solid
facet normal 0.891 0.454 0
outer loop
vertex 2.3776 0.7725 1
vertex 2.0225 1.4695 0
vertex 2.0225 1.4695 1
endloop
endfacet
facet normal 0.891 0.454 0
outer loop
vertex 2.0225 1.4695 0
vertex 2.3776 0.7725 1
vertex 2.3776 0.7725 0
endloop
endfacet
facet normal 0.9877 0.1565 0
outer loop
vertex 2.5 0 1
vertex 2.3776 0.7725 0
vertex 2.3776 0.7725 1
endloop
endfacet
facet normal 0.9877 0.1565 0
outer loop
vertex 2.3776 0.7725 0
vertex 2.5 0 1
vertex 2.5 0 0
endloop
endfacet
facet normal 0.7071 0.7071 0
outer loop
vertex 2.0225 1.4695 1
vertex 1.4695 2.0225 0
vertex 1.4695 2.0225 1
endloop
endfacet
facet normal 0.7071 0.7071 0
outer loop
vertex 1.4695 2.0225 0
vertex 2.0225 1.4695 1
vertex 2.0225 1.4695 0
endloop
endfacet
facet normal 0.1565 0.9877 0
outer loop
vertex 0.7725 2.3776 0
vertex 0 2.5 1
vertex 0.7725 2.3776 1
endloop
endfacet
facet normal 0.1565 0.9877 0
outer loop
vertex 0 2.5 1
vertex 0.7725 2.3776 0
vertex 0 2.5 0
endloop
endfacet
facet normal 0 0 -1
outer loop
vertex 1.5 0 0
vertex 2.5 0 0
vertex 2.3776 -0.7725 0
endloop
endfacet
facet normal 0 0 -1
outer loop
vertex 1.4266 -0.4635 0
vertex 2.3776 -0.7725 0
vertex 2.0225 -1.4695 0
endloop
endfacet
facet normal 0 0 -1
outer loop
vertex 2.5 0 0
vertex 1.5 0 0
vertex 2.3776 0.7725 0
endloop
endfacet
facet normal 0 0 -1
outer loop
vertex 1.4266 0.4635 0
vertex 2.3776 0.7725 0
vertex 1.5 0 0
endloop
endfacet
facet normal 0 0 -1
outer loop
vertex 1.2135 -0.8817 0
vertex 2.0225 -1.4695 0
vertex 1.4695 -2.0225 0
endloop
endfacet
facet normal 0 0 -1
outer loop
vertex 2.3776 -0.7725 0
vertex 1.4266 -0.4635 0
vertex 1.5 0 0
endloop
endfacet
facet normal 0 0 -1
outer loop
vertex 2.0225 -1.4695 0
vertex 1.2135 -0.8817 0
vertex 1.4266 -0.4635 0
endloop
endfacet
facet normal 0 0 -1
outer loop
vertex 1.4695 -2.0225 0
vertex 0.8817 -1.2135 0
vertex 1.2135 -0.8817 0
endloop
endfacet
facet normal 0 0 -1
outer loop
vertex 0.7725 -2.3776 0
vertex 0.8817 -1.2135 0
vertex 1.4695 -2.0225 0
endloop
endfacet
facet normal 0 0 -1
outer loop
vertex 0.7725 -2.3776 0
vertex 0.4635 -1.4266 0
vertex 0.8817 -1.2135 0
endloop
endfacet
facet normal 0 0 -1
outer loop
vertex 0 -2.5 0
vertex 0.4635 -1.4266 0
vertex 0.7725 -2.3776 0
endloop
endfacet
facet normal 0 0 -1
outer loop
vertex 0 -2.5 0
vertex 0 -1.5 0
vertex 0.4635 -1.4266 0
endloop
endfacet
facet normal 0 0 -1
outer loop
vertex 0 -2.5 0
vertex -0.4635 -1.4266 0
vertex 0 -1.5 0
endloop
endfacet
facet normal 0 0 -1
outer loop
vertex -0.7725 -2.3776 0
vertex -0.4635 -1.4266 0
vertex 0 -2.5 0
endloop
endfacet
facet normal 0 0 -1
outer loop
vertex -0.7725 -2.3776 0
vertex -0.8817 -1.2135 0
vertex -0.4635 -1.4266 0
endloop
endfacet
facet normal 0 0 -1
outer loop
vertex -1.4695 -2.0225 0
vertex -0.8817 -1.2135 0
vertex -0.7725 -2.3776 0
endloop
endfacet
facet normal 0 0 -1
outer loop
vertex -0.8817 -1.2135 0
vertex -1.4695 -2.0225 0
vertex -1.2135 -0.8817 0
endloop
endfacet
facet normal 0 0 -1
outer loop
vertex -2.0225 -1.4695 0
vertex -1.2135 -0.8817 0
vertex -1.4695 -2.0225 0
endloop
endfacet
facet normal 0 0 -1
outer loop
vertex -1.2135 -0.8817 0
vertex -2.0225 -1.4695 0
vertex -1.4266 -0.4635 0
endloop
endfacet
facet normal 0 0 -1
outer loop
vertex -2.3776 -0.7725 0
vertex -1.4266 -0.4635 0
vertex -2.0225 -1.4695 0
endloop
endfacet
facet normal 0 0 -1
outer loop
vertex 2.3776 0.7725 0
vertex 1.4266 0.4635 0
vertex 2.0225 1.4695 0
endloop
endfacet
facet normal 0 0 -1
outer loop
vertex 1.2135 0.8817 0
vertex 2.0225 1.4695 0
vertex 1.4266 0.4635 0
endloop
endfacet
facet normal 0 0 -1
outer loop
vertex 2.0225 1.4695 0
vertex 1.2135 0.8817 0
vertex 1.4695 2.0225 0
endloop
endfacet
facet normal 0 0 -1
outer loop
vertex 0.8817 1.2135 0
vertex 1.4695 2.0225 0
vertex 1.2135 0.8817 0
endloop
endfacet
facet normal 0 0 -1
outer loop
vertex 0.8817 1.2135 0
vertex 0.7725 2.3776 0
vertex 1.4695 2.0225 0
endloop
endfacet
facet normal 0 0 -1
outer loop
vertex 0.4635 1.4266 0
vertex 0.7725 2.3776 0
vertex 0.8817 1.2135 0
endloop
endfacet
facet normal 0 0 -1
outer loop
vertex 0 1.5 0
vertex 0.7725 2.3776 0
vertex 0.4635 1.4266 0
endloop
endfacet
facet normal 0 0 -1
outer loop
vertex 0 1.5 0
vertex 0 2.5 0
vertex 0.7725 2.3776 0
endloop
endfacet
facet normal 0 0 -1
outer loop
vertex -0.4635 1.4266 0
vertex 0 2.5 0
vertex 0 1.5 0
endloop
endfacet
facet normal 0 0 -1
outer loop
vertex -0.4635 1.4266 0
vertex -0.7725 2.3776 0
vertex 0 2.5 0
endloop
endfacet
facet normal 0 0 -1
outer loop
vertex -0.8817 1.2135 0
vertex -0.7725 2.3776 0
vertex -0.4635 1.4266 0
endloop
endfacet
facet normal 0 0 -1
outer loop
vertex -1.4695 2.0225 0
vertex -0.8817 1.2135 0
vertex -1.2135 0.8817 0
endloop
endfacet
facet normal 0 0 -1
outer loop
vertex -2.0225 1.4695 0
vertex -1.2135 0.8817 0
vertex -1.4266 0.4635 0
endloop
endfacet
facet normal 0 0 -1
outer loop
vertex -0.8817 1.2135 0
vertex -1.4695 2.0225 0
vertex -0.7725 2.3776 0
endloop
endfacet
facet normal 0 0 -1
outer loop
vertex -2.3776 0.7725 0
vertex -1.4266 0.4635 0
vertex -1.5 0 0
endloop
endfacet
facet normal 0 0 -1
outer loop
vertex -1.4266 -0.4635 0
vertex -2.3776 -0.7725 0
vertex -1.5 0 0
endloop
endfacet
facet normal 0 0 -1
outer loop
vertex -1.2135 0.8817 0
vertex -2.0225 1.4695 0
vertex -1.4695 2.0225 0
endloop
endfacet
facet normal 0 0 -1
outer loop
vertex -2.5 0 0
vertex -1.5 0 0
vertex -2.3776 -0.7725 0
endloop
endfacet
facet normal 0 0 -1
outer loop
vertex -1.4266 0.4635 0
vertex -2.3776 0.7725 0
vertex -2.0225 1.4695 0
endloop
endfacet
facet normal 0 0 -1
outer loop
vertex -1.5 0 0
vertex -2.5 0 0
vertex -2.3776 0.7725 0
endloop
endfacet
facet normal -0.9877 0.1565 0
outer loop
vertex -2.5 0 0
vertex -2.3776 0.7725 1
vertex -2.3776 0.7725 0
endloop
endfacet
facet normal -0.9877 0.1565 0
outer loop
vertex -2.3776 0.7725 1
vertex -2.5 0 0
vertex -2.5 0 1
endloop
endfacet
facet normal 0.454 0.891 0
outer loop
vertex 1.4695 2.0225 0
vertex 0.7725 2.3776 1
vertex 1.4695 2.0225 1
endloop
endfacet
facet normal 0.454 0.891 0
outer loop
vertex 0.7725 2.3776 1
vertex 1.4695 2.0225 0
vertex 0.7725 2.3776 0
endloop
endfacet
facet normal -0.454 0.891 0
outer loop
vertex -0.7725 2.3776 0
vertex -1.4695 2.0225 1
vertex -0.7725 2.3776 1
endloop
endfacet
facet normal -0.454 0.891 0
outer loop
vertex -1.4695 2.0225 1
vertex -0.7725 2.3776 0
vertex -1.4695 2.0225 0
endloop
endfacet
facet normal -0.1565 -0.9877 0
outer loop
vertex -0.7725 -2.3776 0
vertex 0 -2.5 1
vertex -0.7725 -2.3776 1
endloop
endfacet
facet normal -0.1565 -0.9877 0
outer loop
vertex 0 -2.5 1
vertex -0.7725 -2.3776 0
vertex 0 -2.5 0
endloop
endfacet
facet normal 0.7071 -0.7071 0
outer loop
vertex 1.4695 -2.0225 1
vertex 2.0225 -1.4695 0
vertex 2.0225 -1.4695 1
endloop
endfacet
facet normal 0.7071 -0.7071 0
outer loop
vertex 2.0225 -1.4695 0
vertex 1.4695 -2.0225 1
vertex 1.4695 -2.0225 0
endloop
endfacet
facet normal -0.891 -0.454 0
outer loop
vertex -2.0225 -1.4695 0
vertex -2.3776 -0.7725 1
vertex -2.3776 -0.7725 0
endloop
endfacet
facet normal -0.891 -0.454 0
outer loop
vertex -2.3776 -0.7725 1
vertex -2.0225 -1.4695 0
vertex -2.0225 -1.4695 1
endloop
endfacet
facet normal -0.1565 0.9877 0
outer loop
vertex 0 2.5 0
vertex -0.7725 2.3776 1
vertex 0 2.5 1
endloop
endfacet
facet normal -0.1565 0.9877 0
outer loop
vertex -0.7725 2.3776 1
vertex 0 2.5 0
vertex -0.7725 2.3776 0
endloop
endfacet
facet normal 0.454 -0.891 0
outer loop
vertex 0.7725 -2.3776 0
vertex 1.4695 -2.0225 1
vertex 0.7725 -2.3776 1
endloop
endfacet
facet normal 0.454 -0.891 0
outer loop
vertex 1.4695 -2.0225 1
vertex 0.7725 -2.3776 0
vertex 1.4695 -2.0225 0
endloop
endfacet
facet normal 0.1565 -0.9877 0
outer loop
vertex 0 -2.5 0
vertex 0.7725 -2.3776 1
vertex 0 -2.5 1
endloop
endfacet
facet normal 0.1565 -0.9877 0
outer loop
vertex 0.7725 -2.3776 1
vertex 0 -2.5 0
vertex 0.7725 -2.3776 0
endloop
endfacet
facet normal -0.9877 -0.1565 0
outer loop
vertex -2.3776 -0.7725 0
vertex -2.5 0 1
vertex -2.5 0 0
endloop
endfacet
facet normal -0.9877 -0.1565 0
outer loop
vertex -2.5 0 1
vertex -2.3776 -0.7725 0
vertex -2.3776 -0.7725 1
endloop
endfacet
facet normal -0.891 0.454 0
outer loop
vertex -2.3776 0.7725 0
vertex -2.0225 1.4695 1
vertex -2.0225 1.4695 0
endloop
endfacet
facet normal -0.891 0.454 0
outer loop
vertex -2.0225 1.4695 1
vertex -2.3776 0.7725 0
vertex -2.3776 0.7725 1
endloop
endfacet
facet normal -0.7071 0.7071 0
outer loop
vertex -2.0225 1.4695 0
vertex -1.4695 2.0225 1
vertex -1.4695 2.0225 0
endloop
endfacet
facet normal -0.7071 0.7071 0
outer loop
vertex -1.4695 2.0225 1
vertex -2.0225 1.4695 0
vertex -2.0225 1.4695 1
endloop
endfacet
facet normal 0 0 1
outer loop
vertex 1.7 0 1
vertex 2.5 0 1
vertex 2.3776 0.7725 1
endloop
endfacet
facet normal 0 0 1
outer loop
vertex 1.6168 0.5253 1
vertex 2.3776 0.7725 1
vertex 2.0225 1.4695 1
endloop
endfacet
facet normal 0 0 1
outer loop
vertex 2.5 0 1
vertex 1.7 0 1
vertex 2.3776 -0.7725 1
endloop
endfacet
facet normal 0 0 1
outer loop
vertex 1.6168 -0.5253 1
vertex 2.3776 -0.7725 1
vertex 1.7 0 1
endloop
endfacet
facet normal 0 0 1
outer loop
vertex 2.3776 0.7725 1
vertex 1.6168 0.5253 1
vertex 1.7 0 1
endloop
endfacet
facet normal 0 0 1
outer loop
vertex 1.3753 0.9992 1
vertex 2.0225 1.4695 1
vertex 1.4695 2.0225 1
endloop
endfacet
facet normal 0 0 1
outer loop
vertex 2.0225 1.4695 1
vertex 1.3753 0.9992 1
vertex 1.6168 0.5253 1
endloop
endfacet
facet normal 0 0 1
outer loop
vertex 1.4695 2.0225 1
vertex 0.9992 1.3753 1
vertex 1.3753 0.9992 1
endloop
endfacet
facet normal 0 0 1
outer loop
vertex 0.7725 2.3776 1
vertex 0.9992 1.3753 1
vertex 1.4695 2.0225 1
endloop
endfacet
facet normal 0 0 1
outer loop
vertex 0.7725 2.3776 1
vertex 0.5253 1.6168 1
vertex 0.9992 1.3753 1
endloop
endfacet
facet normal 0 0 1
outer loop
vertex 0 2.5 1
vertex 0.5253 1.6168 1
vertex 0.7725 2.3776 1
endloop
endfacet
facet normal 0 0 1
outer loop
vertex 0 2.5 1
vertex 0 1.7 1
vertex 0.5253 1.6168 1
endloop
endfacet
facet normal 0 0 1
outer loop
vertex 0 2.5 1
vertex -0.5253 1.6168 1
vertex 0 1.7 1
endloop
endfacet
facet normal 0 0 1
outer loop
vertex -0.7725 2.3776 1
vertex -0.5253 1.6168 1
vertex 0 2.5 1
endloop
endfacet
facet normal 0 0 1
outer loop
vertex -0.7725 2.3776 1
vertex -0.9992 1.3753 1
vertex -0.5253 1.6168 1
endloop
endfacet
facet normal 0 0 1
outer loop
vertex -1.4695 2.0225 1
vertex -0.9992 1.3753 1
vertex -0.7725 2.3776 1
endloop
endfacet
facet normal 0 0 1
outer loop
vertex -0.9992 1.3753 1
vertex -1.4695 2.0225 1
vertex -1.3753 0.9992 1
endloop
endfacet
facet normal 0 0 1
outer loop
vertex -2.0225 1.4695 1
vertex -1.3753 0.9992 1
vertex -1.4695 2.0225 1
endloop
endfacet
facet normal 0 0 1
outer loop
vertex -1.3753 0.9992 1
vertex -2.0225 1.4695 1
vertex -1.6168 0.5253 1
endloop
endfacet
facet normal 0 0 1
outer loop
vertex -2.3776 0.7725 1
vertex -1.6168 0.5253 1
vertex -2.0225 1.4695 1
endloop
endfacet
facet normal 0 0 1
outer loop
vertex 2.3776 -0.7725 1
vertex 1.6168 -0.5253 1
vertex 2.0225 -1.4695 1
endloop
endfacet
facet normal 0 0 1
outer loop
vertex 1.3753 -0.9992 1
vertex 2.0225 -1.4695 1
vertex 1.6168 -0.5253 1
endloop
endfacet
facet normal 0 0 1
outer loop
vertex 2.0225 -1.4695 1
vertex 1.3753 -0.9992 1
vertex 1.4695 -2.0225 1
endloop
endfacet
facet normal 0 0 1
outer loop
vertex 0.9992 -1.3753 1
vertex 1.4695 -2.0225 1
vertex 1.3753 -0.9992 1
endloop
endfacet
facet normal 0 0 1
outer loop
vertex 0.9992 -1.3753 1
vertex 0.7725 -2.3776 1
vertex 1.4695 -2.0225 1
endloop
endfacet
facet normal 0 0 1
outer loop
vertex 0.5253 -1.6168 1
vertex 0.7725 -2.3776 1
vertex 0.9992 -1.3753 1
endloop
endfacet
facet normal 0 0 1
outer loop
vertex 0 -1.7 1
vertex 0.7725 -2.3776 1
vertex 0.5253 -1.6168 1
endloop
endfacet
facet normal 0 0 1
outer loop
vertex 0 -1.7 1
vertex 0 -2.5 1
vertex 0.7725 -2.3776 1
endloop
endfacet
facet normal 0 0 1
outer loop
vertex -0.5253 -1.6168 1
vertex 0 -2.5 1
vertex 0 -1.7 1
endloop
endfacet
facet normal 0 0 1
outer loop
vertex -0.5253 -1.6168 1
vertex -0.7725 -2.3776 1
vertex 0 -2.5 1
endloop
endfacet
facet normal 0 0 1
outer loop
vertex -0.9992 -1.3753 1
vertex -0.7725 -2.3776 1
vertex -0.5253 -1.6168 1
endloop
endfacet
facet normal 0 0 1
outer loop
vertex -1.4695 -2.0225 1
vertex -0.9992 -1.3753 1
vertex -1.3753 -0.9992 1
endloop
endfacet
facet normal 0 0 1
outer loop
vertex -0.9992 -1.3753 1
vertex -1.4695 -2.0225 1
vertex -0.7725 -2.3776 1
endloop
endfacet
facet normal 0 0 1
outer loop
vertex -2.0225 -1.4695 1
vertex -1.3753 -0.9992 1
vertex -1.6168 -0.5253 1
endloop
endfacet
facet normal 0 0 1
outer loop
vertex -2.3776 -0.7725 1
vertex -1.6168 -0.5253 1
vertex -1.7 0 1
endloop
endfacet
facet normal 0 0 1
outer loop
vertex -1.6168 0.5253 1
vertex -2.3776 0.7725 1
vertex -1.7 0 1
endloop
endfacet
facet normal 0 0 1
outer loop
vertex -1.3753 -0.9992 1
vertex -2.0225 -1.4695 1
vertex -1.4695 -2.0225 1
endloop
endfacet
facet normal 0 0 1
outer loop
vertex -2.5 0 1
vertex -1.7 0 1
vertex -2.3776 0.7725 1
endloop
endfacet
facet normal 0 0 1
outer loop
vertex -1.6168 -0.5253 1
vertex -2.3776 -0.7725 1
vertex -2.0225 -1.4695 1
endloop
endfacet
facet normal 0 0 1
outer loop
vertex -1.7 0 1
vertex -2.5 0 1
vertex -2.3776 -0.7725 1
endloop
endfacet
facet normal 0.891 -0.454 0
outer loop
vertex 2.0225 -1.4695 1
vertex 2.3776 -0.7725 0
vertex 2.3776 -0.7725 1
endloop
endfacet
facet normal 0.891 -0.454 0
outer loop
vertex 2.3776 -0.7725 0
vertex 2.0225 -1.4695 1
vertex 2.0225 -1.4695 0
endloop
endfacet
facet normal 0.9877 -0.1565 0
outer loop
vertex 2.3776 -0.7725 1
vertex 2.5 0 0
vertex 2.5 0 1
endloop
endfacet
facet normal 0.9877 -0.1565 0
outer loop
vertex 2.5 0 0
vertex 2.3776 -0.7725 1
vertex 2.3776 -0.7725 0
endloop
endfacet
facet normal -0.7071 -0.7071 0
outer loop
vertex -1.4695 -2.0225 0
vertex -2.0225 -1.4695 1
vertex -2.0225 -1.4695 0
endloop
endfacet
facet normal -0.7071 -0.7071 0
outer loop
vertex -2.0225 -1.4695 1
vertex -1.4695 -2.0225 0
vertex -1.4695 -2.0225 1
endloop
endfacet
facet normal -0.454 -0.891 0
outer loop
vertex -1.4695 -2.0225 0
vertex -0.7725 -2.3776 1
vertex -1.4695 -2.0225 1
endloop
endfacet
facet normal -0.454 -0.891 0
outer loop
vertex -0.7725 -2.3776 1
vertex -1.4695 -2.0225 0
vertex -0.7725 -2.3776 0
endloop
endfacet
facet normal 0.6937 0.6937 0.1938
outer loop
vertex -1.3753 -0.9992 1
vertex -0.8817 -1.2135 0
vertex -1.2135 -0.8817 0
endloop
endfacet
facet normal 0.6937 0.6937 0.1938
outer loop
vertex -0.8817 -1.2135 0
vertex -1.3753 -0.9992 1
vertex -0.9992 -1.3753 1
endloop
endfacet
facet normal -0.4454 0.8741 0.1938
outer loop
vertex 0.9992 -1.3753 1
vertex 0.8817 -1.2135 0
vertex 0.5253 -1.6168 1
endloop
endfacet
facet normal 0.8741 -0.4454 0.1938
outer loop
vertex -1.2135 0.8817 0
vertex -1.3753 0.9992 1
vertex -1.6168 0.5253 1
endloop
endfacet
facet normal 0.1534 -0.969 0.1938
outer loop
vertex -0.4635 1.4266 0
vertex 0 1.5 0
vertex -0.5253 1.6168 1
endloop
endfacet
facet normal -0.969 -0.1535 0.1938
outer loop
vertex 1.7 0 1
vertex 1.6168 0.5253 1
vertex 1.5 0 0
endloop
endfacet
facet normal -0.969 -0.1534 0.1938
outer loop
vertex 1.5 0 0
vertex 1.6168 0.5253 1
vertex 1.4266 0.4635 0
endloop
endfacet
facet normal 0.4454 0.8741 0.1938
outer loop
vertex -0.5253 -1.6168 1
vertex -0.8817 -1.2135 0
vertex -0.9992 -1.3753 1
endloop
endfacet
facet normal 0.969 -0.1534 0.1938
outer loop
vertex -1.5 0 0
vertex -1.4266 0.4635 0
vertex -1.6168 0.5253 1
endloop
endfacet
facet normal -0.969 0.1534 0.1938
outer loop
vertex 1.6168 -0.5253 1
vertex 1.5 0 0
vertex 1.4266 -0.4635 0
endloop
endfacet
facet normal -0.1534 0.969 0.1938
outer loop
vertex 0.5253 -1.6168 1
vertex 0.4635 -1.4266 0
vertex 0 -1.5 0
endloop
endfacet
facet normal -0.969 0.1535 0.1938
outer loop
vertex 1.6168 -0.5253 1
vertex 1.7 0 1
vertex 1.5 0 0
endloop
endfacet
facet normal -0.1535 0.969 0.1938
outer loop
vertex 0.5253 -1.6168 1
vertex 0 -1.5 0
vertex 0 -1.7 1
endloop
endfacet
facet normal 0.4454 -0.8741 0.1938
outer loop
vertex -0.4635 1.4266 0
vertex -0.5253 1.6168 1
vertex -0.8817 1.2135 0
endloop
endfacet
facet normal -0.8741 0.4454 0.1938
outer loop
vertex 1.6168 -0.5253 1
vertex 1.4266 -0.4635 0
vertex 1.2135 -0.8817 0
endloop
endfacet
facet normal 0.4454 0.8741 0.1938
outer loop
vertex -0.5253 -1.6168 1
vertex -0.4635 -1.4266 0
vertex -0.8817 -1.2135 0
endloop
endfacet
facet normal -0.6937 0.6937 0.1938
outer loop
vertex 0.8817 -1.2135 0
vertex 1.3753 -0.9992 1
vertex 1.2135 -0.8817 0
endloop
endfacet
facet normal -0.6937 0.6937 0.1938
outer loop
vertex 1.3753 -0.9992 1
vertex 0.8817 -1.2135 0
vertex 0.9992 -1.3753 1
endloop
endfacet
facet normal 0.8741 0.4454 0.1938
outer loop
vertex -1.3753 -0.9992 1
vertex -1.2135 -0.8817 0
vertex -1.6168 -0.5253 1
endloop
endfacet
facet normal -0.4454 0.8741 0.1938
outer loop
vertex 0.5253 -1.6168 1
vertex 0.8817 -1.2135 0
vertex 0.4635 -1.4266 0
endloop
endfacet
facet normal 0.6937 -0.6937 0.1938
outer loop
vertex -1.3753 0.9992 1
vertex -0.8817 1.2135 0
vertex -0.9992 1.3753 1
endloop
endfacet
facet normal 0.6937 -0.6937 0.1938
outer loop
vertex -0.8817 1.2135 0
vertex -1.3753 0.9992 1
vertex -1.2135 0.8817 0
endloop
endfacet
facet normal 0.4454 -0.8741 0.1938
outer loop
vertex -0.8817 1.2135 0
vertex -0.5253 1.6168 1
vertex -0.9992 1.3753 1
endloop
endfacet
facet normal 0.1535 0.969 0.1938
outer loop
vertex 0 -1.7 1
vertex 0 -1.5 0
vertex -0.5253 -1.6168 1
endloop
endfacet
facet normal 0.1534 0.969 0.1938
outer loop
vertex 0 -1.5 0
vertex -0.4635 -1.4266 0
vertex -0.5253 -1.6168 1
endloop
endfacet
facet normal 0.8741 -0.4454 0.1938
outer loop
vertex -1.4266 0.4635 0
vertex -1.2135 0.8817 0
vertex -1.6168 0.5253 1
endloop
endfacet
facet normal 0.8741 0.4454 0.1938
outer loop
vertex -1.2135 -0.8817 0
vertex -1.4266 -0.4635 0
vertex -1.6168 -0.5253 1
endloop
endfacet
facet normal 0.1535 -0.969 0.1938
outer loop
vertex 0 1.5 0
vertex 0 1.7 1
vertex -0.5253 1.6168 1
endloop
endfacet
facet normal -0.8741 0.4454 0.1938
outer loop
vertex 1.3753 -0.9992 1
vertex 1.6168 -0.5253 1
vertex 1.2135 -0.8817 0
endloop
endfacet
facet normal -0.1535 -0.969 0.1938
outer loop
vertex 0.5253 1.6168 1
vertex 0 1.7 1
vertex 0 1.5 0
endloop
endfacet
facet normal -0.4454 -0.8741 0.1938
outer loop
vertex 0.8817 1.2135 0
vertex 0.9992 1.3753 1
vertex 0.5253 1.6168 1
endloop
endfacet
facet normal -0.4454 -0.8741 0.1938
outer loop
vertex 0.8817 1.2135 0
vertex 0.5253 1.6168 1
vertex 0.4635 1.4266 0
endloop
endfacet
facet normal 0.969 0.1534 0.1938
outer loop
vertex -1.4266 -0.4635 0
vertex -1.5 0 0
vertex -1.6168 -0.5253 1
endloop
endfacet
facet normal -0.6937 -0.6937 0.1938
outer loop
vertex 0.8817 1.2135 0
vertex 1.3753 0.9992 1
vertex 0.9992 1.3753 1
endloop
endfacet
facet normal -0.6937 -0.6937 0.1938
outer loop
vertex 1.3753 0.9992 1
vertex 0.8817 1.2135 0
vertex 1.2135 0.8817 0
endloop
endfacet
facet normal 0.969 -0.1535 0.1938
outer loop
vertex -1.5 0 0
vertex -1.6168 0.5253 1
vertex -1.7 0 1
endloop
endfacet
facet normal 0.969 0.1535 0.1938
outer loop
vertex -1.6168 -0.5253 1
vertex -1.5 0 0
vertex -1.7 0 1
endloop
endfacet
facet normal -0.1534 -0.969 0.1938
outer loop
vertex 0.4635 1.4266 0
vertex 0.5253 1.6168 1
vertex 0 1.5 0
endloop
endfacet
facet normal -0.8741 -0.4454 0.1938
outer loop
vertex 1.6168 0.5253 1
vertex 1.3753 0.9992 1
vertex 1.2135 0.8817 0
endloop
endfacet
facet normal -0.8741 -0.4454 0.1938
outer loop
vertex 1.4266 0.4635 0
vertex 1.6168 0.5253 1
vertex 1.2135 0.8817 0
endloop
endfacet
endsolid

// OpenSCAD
//

ep=1;
de=5;
di=3;


difference()
{
    cylinder(ep,de/2,de/2,$fn=20);
    cylinder(ep,di/2,di/2+.2,$fn=20);

}
